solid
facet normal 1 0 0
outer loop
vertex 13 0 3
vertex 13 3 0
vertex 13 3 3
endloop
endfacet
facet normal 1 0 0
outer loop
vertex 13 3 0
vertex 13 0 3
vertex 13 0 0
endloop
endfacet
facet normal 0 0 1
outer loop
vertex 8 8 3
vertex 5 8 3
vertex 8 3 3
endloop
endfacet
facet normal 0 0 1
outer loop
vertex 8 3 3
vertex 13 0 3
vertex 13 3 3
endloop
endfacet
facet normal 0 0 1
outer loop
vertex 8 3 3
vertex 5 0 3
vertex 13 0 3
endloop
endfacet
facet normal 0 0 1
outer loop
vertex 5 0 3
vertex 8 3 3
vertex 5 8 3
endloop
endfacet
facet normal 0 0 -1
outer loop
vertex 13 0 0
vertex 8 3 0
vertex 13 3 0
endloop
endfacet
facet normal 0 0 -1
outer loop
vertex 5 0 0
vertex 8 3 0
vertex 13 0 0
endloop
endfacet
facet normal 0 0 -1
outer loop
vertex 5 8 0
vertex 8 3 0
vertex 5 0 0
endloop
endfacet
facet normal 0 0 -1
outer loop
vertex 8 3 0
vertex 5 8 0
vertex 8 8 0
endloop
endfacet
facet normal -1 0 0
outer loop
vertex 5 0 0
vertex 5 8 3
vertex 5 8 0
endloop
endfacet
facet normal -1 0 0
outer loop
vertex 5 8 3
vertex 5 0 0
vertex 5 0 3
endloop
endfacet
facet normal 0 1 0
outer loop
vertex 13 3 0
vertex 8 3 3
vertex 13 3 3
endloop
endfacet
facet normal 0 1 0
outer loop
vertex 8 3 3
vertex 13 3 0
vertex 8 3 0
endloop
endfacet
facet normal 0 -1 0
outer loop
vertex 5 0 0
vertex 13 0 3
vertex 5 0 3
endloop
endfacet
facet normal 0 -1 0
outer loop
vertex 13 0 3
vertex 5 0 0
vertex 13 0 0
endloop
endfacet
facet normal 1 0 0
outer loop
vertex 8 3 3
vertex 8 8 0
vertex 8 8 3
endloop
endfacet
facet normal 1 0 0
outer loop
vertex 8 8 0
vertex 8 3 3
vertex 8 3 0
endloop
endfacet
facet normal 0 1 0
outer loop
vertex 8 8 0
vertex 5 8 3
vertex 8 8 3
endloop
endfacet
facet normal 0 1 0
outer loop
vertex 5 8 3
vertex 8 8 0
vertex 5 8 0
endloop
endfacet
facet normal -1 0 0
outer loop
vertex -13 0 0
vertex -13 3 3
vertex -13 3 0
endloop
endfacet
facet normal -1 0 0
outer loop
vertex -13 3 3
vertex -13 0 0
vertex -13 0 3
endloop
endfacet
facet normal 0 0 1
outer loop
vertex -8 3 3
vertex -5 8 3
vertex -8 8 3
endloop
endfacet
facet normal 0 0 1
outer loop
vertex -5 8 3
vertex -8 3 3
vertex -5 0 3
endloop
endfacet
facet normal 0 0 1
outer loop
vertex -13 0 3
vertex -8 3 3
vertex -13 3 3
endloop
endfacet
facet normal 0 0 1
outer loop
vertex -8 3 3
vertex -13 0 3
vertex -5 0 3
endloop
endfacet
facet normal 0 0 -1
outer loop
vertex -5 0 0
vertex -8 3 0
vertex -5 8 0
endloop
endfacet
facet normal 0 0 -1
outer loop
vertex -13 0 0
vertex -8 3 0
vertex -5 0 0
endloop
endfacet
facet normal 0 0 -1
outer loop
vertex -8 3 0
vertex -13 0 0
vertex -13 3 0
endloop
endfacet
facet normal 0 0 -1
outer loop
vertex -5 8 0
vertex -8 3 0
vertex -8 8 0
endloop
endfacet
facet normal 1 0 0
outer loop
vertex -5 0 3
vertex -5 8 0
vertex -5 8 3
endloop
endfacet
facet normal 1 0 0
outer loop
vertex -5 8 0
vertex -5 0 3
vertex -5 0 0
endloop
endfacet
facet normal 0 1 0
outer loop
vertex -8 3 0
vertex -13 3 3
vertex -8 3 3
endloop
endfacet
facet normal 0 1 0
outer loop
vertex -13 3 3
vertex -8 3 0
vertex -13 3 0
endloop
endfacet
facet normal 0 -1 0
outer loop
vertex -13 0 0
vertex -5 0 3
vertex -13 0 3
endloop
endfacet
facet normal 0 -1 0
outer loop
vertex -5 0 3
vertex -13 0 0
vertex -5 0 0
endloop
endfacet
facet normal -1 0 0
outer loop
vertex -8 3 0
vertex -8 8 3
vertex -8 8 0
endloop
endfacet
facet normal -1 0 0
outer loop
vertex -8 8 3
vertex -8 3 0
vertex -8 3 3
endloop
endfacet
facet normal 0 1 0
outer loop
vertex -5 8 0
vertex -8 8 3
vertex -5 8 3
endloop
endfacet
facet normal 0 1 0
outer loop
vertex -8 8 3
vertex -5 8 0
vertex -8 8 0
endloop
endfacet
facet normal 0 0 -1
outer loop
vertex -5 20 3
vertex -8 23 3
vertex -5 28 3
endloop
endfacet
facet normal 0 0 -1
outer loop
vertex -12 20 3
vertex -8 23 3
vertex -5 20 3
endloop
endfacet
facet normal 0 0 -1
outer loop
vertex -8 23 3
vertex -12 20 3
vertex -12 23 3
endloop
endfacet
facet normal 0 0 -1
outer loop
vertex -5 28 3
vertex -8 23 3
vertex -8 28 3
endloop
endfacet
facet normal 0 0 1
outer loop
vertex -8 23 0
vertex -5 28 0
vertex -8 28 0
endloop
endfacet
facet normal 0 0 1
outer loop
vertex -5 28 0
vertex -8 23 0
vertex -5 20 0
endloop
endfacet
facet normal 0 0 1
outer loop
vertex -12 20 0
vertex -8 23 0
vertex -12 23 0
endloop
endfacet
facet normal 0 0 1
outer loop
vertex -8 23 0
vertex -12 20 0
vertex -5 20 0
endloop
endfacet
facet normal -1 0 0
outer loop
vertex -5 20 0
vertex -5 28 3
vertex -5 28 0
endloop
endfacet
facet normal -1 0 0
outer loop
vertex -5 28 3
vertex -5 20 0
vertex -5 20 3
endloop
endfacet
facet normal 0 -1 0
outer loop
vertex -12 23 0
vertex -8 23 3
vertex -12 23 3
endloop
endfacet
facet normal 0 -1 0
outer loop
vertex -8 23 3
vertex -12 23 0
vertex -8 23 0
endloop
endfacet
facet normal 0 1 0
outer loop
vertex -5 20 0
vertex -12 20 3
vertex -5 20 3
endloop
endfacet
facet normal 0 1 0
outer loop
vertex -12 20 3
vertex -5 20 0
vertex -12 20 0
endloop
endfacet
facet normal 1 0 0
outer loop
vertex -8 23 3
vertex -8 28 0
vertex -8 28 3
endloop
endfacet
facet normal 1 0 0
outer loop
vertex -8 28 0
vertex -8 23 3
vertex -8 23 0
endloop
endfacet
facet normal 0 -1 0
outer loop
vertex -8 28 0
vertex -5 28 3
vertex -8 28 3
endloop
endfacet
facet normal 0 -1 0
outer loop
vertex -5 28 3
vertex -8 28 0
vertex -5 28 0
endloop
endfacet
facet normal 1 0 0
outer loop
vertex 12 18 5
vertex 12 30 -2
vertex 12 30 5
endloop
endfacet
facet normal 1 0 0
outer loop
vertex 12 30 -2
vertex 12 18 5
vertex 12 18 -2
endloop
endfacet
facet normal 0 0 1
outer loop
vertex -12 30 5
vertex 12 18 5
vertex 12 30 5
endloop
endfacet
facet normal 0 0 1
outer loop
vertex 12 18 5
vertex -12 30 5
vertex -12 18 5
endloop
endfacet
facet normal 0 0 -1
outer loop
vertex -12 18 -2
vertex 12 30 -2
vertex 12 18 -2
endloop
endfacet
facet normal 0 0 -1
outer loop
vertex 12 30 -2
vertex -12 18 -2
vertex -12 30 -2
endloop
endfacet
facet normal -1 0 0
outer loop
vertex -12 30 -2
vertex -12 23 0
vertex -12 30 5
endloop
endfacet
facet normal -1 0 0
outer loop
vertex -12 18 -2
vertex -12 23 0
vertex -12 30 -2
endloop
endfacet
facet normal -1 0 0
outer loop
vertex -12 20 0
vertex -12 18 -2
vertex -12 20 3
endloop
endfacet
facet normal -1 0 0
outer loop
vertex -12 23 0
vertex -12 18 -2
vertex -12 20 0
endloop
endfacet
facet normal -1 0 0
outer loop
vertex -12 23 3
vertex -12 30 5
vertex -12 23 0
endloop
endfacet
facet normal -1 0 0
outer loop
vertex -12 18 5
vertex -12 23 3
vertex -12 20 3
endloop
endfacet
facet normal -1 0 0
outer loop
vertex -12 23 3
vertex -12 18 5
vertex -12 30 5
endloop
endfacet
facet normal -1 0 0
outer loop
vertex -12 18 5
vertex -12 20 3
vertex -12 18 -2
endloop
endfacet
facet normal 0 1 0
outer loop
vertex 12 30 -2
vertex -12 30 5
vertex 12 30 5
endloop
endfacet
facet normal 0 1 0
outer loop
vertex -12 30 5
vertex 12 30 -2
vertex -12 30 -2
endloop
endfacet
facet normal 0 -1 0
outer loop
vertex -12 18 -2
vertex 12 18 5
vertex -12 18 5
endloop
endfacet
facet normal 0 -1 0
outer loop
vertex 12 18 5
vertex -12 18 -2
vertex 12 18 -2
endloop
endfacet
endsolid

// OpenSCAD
// test_mirror_solid.scad
//
// Minimal reproducer for multmatrix REFLECTION (OpenSCAD mirror) handling in the
// importer.  An asymmetric L-shaped solid at +X, plus its mirror across X=0,
// UNIONED together.  Correct result: a symmetric pair of L's (mirror image),
// fully merged.  Failure modes the importer has shown:
//   - reflection dropped  -> both L's land on the +X side (asymmetric/overlap)
//   - reflection inverts solid orientation -> union breaks, parts detached
//
// Also a version using the L as a difference subtrahend, to exercise the
// boolean-orientation path (a mirrored, inside-out solid subtracts wrong).

module Lshape() {
    union() {
        cube([8, 3, 3]);
        cube([3, 8, 3]);
    }
}

// (a) union of an L and its X-mirror — should be symmetric and fully merged
union() {
    translate([5, 0, 0]) Lshape();
    mirror([1, 0, 0]) translate([5, 0, 0]) Lshape();
}

// (b) a block with a mirrored L subtracted from it, shifted clear in Y
translate([0, 20, 0])
difference() {
    translate([-12, -2, -2]) cube([24, 12, 7]);
    mirror([1, 0, 0]) translate([5, 0, 0]) Lshape();
}
